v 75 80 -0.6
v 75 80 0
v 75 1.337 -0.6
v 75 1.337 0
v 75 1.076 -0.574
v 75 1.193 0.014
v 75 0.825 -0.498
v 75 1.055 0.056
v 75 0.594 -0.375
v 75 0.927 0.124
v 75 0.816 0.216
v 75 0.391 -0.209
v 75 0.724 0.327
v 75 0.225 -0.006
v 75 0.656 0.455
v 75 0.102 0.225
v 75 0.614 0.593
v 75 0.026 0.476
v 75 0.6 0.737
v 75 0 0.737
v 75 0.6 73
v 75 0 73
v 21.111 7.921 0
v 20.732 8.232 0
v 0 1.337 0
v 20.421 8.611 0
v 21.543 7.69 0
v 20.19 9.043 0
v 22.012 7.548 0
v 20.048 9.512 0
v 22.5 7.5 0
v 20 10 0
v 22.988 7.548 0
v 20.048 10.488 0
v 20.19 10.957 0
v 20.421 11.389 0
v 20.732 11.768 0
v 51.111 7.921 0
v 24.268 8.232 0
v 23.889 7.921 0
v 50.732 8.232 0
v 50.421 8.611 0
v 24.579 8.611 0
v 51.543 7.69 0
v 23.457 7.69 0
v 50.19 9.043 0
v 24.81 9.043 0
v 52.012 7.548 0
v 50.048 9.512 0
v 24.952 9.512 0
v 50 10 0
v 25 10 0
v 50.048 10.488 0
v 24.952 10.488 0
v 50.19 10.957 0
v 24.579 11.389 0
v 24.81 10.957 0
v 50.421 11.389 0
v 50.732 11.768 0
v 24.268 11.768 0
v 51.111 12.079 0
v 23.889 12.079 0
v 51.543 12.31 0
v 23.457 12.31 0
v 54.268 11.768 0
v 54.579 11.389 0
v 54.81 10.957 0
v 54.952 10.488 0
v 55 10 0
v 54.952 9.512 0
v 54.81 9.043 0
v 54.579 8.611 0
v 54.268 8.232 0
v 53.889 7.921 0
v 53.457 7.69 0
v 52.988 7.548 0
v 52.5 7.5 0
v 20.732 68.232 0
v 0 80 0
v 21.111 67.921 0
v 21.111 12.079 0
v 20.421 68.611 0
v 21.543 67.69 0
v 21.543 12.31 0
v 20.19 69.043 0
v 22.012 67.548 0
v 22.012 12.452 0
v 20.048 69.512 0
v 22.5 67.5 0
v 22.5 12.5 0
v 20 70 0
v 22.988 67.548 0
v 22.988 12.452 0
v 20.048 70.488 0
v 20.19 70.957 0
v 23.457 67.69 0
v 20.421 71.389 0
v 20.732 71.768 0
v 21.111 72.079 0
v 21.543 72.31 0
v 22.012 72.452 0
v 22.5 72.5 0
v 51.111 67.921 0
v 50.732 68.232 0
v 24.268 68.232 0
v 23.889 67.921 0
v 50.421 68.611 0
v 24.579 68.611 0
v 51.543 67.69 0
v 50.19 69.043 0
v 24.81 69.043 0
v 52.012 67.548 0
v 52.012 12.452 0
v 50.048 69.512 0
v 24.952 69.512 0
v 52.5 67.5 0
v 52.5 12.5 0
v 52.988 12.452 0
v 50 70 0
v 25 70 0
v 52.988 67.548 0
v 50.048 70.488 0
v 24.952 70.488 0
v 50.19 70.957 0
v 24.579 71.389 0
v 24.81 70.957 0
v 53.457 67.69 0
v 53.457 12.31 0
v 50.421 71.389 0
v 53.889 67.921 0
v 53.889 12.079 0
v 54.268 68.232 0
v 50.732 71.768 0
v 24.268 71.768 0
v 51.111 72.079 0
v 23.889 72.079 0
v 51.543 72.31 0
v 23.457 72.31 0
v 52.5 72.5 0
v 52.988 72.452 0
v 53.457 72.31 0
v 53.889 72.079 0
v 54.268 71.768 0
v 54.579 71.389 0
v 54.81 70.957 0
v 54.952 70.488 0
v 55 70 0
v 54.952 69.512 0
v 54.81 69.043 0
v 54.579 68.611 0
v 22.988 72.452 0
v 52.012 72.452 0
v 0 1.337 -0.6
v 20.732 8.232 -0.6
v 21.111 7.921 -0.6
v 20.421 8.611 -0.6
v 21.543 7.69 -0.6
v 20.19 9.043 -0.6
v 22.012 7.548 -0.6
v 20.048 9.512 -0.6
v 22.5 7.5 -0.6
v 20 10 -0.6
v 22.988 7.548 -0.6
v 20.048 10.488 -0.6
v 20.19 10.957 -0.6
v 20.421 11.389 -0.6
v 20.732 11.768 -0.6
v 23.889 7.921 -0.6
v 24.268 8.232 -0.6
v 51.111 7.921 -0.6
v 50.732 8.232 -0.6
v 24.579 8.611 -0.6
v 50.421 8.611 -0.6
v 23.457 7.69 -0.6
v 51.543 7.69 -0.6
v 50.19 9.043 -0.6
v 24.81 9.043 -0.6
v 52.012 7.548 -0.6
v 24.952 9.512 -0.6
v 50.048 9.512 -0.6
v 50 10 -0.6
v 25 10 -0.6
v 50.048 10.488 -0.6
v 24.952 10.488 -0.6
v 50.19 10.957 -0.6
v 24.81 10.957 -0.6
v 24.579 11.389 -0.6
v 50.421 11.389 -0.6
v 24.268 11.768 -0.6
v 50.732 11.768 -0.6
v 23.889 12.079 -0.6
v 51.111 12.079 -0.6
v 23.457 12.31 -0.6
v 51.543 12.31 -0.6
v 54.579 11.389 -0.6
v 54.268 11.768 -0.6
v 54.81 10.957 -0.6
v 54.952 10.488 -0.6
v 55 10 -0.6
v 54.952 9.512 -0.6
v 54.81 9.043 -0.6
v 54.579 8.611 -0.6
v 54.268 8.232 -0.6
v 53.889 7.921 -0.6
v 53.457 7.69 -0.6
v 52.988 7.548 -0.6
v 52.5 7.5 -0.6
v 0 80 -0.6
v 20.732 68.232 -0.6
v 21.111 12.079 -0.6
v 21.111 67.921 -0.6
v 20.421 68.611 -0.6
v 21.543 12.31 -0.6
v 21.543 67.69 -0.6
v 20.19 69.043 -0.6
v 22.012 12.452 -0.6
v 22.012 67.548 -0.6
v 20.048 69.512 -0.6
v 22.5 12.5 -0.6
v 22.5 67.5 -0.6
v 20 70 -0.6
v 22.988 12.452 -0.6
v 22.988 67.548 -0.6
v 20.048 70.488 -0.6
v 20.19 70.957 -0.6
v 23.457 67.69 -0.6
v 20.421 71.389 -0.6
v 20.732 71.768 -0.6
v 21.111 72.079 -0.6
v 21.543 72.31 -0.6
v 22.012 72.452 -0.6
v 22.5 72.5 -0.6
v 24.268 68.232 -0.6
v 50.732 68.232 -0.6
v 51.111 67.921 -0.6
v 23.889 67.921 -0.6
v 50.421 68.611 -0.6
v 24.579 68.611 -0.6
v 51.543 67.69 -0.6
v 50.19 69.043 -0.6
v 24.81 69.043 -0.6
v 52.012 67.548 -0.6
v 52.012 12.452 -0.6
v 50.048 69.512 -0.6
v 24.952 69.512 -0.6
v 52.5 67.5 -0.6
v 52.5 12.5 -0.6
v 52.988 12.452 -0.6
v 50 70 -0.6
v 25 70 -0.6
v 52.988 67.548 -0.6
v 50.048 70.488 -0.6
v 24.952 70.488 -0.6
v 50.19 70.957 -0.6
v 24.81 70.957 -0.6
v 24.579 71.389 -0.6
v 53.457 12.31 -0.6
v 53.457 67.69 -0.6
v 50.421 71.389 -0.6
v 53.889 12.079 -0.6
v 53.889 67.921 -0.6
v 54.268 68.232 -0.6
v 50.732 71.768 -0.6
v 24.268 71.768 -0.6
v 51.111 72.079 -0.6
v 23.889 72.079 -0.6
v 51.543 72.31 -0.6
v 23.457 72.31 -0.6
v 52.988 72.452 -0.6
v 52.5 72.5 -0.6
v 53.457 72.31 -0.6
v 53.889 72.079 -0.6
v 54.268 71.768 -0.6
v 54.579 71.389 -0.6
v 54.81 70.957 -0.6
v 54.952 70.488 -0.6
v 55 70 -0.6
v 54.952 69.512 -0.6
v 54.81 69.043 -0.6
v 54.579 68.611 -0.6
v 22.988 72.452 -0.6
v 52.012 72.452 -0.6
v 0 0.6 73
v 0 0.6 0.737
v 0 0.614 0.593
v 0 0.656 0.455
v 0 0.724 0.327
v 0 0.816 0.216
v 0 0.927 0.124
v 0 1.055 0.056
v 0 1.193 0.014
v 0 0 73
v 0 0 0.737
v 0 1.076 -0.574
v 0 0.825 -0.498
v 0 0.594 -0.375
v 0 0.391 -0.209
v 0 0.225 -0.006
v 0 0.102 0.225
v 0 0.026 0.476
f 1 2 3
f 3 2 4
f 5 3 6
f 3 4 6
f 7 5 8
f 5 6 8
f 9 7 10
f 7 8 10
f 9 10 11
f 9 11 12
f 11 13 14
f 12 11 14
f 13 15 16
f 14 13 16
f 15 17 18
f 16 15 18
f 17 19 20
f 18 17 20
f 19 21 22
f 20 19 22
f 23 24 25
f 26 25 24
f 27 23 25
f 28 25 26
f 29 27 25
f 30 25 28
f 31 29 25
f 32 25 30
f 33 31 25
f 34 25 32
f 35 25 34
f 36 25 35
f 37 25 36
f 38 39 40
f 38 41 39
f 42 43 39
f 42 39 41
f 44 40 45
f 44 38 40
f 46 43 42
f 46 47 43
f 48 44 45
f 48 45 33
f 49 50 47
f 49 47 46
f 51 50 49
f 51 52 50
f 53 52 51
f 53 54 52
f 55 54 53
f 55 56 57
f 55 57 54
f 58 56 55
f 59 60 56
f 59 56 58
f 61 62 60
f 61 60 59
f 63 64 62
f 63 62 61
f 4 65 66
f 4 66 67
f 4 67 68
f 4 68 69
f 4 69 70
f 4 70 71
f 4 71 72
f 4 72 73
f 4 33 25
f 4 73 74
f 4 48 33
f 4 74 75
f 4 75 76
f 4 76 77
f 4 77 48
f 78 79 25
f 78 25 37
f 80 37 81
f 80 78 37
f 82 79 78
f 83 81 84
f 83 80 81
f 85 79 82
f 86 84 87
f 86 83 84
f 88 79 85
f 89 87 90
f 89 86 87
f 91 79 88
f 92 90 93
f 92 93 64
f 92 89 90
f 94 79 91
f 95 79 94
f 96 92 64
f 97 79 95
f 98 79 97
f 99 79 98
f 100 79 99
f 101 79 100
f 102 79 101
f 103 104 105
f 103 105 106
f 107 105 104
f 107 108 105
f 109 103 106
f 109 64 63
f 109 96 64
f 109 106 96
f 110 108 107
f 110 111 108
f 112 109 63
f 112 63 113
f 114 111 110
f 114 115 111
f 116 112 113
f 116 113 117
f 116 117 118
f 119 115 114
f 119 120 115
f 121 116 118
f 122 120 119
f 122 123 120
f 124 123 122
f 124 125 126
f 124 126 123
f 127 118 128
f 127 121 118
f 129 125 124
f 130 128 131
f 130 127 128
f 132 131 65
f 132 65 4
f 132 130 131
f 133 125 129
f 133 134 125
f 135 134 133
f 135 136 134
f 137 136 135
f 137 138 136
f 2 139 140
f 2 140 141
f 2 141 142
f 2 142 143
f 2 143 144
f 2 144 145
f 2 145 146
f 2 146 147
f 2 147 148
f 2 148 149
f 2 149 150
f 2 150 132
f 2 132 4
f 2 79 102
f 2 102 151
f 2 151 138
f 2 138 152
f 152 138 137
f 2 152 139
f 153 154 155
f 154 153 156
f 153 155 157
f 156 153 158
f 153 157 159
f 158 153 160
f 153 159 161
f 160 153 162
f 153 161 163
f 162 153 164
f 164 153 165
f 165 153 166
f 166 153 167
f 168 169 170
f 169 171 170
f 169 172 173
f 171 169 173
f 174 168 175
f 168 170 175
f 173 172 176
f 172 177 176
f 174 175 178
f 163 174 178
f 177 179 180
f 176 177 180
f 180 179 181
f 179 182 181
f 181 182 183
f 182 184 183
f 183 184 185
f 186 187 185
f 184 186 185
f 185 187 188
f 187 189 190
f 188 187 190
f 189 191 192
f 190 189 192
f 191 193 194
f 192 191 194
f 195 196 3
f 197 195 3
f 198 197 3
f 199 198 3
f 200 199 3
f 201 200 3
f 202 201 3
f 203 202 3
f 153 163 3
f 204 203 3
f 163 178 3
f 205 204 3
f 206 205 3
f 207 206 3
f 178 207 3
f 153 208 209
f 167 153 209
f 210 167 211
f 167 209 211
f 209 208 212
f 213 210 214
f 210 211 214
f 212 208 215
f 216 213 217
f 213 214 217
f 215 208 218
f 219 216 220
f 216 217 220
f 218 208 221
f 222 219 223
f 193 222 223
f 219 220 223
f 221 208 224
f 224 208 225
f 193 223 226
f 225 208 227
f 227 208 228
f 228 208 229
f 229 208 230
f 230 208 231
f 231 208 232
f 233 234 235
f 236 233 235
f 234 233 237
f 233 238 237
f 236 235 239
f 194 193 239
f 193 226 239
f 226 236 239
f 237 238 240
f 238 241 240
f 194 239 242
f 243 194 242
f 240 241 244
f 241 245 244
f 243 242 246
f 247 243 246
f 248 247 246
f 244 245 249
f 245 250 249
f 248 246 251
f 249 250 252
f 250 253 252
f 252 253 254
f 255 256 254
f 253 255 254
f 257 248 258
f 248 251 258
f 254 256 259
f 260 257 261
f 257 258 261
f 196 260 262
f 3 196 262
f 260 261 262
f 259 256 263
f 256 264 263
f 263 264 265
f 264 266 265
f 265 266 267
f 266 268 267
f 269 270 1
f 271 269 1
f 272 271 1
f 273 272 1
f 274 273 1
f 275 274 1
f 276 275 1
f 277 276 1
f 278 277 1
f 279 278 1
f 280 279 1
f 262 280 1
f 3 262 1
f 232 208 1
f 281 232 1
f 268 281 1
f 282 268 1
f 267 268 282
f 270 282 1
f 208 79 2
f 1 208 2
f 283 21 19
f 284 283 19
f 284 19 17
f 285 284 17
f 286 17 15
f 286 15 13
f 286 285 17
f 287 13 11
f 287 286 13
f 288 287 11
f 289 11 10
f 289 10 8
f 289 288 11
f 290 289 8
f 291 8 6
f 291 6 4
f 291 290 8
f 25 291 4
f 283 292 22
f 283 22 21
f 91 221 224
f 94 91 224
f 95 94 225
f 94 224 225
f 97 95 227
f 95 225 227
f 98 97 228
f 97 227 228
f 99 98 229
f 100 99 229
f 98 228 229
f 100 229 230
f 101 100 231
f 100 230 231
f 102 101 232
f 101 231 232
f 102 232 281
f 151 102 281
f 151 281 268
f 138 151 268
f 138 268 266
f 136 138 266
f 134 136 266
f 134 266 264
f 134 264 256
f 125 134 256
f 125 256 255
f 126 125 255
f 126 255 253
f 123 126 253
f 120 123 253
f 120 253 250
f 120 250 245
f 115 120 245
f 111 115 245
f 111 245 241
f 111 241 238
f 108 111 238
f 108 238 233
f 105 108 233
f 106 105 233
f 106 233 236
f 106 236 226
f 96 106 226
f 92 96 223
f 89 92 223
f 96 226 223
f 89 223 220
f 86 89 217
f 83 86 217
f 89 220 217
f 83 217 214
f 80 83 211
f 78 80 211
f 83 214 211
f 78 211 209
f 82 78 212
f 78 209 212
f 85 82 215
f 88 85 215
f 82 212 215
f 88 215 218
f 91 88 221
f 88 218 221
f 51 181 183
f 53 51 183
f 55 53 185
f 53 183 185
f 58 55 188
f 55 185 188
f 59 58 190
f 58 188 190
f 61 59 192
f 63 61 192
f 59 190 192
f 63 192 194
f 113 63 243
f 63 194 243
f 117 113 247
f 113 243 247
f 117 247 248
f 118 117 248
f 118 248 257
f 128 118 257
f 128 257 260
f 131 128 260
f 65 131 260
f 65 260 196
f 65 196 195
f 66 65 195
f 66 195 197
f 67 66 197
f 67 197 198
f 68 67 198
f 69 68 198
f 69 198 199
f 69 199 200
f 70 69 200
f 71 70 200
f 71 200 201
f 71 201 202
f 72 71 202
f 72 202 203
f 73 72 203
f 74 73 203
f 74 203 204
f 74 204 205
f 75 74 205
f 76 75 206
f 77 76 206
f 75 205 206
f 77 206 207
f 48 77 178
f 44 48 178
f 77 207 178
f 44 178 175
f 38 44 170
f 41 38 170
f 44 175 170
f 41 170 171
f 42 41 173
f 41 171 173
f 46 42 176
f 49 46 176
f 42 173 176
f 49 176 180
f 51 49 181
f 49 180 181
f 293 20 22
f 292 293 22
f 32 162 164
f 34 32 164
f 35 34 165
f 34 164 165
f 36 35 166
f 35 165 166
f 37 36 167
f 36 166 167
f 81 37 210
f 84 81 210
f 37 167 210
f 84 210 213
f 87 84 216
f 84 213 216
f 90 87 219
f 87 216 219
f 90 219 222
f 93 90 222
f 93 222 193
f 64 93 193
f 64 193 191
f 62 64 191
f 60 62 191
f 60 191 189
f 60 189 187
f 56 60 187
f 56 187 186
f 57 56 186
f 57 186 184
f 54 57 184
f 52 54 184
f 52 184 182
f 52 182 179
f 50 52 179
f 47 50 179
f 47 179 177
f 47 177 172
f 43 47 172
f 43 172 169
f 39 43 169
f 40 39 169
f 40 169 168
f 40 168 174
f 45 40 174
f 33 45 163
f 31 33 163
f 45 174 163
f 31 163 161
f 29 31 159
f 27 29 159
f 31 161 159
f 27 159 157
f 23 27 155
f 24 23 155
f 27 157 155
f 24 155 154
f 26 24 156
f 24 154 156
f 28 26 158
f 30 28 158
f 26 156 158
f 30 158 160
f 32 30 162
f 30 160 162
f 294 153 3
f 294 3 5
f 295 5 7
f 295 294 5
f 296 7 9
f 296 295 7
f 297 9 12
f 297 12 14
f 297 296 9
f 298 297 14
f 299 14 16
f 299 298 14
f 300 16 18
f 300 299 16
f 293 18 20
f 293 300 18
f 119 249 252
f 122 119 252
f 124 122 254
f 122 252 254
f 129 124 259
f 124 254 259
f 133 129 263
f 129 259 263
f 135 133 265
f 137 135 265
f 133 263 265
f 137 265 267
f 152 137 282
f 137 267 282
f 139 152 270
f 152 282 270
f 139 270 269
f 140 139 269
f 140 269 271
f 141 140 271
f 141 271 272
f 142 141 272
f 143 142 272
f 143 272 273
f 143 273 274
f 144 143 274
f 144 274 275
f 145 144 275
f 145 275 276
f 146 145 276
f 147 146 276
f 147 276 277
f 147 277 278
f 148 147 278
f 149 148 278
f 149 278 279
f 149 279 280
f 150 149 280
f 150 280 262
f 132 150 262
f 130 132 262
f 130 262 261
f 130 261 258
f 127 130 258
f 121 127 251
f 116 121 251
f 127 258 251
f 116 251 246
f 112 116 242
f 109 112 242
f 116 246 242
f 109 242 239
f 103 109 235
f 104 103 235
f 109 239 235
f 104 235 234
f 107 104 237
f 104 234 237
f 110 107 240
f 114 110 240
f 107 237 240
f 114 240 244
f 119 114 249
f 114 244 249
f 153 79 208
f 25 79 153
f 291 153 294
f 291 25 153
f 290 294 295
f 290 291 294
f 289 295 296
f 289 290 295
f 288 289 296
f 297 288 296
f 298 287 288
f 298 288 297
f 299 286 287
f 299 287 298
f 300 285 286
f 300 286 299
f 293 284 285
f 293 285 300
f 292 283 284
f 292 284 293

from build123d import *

# Parameters (mm, degrees)
SKETCH2_W                    = 75
SKETCH2_H                    = 80
BASE_FLANGE1_DEPTH           = 0.6
CUT_EXTRUDE1_REACH           = 111.66
SKETCH10_R                   = 2.5
EDGE_FLANGE1_STRIP_W         = 3.8732
EDGE_FLANGE1_STRIP_H         = 0.6
EDGE_FLANGE1_STRIP_CUT_DEPTH = 75
EDGE_FLANGE1_DEPTH           = 75


# Sheet-metal steps are written as plain solids
with BuildPart() as part:
    # Sketch2 → Base-Flange1 (new body)
    with BuildSketch(Plane.XY):
        with Locations((37.5, 40)):
            Rectangle(SKETCH2_W, SKETCH2_H)
    extrude(amount=-BASE_FLANGE1_DEPTH)

    # Sketch10 → Cut-Extrude1 (cut, up to next)
    with BuildSketch(Plane(origin=(0, 0, -0.6), x_dir=(-1, 0, 0), z_dir=(0, 0, -1)), mode=Mode.PRIVATE) as cut_extrude1_sk1:
        with Locations((-22.5, 10)):
            Circle(SKETCH10_R)
    cut_extrude1_tool1 = extrude(cut_extrude1_sk1.sketch, amount=-CUT_EXTRUDE1_REACH, mode=Mode.PRIVATE) & part.part
    # Sketch10 → Cut-Extrude1 (cut, up to next)
    with BuildSketch(Plane(origin=(0, 0, -0.6), x_dir=(-1, 0, 0), z_dir=(0, 0, -1)), mode=Mode.PRIVATE) as cut_extrude1_sk2:
        with Locations((-52.5, 70)):
            Circle(SKETCH10_R)
    cut_extrude1_tool2 = extrude(cut_extrude1_sk2.sketch, amount=-CUT_EXTRUDE1_REACH, mode=Mode.PRIVATE) & part.part
    # Sketch10 → Cut-Extrude1 (cut, up to next)
    with BuildSketch(Plane(origin=(0, 0, -0.6), x_dir=(-1, 0, 0), z_dir=(0, 0, -1)), mode=Mode.PRIVATE) as cut_extrude1_sk3:
        with Locations((-52.5, 10)):
            Circle(SKETCH10_R)
    cut_extrude1_tool3 = extrude(cut_extrude1_sk3.sketch, amount=-CUT_EXTRUDE1_REACH, mode=Mode.PRIVATE) & part.part
    # Sketch10 → Cut-Extrude1 (cut, up to next)
    with BuildSketch(Plane(origin=(0, 0, -0.6), x_dir=(-1, 0, 0), z_dir=(0, 0, -1)), mode=Mode.PRIVATE) as cut_extrude1_sk4:
        with Locations((-22.5, 70)):
            Circle(SKETCH10_R)
    cut_extrude1_tool4 = extrude(cut_extrude1_sk4.sketch, amount=-CUT_EXTRUDE1_REACH, mode=Mode.PRIVATE) & part.part
    add(cut_extrude1_tool1.solids().sort_by_distance((22.5, 10, -0.6))[0], mode=Mode.SUBTRACT)
    add(cut_extrude1_tool2.solids().sort_by_distance((52.5, 70, -0.6))[0], mode=Mode.SUBTRACT)
    add(cut_extrude1_tool3.solids().sort_by_distance((52.5, 10, -0.6))[0], mode=Mode.SUBTRACT)
    add(cut_extrude1_tool4.solids().sort_by_distance((22.5, 70, -0.6))[0], mode=Mode.SUBTRACT)

    # Edge-Flange1 strip (across the edge) → Edge-Flange1 strip cut (cut)
    with BuildSketch(Plane.YZ):
        with Locations((-0.6, -0.3)):
            Rectangle(EDGE_FLANGE1_STRIP_W, EDGE_FLANGE1_STRIP_H)
    extrude(amount=EDGE_FLANGE1_STRIP_CUT_DEPTH, mode=Mode.SUBTRACT)

    # Edge-Flange1 section (across the edge) → Edge-Flange1 (add)
    with BuildSketch(Plane.YZ):
        with BuildLine():
            Line((0, 0.7366), (0, 73))
            Line((0, 73), (0.6, 73))
            Line((0.6, 73), (0.6, 0.7366))
            ThreePointArc((0.6, 0.7366), (0.815745145, 0.215745145), (1.3366, 0))
            Line((1.3366, 0), (1.3366, -0.6))
            ThreePointArc((1.3366, -0.6), (0.391481076, -0.208518924), (0, 0.7366))
        make_face()
    extrude(amount=EDGE_FLANGE1_DEPTH)


solid = part.part
